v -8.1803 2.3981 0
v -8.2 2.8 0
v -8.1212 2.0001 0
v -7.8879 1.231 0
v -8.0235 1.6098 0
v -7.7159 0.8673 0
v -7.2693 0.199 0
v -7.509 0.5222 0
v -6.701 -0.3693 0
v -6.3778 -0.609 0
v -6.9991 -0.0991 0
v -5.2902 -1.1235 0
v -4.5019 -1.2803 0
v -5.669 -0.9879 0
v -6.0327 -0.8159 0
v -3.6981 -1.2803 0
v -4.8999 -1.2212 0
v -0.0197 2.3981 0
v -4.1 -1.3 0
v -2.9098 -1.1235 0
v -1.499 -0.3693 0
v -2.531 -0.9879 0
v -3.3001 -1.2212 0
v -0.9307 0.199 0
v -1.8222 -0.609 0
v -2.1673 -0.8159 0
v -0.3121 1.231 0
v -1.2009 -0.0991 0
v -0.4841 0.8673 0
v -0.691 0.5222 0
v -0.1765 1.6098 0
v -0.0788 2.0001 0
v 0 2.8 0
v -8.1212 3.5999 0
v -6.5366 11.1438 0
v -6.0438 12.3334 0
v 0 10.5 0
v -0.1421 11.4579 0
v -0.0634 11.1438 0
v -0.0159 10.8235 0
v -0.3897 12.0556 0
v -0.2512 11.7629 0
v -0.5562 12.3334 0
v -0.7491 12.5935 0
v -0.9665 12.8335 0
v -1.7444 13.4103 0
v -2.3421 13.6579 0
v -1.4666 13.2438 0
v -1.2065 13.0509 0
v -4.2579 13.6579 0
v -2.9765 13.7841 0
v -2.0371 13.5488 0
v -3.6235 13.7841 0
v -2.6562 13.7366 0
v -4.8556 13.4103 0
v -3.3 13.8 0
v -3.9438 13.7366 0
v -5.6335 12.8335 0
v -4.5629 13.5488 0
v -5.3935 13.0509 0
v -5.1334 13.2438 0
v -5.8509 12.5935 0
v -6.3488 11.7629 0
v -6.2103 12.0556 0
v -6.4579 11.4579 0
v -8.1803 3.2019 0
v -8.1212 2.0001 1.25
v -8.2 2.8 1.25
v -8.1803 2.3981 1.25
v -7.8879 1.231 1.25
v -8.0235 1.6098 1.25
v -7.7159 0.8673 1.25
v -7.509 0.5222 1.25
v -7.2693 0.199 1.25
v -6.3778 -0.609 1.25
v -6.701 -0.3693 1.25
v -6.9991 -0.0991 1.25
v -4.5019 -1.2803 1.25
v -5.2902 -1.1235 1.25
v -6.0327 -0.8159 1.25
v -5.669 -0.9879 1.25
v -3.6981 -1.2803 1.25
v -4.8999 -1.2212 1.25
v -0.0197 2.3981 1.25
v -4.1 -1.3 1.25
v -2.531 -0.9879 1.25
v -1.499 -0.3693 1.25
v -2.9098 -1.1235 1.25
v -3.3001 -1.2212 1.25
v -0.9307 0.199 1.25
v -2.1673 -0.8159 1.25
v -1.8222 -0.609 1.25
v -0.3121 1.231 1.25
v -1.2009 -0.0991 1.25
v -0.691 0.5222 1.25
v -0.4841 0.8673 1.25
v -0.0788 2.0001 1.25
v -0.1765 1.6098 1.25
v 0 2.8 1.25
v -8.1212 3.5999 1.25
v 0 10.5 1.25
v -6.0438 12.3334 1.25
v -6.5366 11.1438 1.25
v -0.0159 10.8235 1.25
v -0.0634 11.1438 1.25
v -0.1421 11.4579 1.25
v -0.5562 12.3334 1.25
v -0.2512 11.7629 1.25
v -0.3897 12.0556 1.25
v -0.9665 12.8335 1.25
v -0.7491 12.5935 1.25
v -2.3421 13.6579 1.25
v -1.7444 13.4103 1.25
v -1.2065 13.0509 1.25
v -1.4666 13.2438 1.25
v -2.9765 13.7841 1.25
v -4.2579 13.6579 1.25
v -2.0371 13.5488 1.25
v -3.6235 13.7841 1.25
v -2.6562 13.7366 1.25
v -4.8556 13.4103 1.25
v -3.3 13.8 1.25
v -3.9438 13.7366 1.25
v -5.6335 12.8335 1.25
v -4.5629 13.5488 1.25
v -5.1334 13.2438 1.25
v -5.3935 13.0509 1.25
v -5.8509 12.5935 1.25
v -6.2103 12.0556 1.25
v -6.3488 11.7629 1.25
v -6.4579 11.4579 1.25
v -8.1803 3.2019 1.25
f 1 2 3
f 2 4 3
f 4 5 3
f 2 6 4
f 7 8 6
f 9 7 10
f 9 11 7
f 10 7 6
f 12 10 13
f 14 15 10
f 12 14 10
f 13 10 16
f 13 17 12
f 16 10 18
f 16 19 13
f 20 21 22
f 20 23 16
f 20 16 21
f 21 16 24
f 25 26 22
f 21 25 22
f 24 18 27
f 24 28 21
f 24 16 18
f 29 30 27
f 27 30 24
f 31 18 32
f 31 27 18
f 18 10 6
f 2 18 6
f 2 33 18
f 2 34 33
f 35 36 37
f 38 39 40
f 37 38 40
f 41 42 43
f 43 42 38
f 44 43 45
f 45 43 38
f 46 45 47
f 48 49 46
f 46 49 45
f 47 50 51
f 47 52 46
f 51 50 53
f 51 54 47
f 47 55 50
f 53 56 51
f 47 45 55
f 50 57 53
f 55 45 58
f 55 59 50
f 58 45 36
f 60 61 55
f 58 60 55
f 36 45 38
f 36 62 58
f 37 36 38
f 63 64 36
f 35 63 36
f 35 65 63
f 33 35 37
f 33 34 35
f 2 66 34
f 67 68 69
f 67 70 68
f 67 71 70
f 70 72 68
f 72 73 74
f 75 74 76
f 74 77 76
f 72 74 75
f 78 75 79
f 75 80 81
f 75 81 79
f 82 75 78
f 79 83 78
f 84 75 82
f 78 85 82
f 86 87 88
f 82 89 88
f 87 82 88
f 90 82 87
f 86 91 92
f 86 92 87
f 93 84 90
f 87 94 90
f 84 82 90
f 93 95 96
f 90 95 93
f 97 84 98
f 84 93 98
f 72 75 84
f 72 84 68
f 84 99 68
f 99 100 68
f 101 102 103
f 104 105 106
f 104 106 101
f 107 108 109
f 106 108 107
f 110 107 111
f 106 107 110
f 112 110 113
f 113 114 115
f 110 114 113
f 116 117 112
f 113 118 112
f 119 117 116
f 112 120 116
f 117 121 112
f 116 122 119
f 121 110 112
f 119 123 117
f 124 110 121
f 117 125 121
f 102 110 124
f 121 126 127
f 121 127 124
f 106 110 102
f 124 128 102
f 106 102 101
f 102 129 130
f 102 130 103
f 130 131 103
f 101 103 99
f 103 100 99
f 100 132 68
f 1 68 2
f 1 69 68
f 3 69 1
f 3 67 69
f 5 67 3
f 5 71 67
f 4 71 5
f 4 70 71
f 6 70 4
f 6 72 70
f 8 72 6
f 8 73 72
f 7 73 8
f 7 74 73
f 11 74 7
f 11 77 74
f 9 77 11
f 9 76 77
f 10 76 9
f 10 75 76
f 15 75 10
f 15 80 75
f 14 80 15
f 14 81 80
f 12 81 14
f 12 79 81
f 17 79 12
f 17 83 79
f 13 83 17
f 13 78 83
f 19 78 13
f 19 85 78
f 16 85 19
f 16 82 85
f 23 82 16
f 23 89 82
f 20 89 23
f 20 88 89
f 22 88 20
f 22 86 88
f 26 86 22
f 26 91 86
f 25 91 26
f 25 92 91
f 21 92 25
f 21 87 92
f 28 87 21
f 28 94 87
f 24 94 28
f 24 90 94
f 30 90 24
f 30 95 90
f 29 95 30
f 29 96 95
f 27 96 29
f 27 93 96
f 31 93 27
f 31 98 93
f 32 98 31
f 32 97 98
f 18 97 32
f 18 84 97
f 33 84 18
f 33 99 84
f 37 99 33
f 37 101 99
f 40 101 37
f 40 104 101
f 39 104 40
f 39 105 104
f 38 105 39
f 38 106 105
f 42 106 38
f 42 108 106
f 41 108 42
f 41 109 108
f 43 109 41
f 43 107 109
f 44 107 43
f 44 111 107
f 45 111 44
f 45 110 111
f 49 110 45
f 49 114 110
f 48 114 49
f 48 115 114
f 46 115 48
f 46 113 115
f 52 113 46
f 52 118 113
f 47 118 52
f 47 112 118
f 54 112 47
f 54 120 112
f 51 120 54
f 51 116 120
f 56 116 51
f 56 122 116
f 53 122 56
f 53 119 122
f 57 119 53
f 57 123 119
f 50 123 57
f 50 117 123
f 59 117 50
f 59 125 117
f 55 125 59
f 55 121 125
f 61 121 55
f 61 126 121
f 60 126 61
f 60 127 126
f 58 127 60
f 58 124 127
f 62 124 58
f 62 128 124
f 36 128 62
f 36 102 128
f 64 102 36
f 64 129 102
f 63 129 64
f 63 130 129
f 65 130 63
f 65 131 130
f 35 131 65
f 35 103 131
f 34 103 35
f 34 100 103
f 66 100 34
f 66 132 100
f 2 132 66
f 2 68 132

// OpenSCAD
// Acoustic violin parametric placeholder geometry.
// NOT fabrication authority. Scaffold for future CAD authoring.
// All dimensions sourced from acoustic-violin-design-table.xlsx (baseline).
// Authority: pending_measurement — do not use for fabrication without
// review against family-spec.csv and a measured template.

scale_length_in     = 12.9;   // L2 scaffold; verify with luthier reference
body_length_in      = 14.0;
upper_bout_in       = 6.6;
lower_bout_in       = 8.2;
rib_height_in       = 1.25;
top_thickness_in    = 0.12;
back_thickness_in   = 0.16;
f_hole_spacing_in   = 4.2;
neck_angle_deg      = 4.0;
string_count        = 4;

module body_outline() {
  hull() {
    translate([-upper_bout_in/2, body_length_in * 0.75, 0])
      circle(d=upper_bout_in, $fn=64);
    translate([-lower_bout_in/2, body_length_in * 0.20, 0])
      circle(d=lower_bout_in, $fn=64);
  }
}

linear_extrude(height=rib_height_in)
  body_outline();
